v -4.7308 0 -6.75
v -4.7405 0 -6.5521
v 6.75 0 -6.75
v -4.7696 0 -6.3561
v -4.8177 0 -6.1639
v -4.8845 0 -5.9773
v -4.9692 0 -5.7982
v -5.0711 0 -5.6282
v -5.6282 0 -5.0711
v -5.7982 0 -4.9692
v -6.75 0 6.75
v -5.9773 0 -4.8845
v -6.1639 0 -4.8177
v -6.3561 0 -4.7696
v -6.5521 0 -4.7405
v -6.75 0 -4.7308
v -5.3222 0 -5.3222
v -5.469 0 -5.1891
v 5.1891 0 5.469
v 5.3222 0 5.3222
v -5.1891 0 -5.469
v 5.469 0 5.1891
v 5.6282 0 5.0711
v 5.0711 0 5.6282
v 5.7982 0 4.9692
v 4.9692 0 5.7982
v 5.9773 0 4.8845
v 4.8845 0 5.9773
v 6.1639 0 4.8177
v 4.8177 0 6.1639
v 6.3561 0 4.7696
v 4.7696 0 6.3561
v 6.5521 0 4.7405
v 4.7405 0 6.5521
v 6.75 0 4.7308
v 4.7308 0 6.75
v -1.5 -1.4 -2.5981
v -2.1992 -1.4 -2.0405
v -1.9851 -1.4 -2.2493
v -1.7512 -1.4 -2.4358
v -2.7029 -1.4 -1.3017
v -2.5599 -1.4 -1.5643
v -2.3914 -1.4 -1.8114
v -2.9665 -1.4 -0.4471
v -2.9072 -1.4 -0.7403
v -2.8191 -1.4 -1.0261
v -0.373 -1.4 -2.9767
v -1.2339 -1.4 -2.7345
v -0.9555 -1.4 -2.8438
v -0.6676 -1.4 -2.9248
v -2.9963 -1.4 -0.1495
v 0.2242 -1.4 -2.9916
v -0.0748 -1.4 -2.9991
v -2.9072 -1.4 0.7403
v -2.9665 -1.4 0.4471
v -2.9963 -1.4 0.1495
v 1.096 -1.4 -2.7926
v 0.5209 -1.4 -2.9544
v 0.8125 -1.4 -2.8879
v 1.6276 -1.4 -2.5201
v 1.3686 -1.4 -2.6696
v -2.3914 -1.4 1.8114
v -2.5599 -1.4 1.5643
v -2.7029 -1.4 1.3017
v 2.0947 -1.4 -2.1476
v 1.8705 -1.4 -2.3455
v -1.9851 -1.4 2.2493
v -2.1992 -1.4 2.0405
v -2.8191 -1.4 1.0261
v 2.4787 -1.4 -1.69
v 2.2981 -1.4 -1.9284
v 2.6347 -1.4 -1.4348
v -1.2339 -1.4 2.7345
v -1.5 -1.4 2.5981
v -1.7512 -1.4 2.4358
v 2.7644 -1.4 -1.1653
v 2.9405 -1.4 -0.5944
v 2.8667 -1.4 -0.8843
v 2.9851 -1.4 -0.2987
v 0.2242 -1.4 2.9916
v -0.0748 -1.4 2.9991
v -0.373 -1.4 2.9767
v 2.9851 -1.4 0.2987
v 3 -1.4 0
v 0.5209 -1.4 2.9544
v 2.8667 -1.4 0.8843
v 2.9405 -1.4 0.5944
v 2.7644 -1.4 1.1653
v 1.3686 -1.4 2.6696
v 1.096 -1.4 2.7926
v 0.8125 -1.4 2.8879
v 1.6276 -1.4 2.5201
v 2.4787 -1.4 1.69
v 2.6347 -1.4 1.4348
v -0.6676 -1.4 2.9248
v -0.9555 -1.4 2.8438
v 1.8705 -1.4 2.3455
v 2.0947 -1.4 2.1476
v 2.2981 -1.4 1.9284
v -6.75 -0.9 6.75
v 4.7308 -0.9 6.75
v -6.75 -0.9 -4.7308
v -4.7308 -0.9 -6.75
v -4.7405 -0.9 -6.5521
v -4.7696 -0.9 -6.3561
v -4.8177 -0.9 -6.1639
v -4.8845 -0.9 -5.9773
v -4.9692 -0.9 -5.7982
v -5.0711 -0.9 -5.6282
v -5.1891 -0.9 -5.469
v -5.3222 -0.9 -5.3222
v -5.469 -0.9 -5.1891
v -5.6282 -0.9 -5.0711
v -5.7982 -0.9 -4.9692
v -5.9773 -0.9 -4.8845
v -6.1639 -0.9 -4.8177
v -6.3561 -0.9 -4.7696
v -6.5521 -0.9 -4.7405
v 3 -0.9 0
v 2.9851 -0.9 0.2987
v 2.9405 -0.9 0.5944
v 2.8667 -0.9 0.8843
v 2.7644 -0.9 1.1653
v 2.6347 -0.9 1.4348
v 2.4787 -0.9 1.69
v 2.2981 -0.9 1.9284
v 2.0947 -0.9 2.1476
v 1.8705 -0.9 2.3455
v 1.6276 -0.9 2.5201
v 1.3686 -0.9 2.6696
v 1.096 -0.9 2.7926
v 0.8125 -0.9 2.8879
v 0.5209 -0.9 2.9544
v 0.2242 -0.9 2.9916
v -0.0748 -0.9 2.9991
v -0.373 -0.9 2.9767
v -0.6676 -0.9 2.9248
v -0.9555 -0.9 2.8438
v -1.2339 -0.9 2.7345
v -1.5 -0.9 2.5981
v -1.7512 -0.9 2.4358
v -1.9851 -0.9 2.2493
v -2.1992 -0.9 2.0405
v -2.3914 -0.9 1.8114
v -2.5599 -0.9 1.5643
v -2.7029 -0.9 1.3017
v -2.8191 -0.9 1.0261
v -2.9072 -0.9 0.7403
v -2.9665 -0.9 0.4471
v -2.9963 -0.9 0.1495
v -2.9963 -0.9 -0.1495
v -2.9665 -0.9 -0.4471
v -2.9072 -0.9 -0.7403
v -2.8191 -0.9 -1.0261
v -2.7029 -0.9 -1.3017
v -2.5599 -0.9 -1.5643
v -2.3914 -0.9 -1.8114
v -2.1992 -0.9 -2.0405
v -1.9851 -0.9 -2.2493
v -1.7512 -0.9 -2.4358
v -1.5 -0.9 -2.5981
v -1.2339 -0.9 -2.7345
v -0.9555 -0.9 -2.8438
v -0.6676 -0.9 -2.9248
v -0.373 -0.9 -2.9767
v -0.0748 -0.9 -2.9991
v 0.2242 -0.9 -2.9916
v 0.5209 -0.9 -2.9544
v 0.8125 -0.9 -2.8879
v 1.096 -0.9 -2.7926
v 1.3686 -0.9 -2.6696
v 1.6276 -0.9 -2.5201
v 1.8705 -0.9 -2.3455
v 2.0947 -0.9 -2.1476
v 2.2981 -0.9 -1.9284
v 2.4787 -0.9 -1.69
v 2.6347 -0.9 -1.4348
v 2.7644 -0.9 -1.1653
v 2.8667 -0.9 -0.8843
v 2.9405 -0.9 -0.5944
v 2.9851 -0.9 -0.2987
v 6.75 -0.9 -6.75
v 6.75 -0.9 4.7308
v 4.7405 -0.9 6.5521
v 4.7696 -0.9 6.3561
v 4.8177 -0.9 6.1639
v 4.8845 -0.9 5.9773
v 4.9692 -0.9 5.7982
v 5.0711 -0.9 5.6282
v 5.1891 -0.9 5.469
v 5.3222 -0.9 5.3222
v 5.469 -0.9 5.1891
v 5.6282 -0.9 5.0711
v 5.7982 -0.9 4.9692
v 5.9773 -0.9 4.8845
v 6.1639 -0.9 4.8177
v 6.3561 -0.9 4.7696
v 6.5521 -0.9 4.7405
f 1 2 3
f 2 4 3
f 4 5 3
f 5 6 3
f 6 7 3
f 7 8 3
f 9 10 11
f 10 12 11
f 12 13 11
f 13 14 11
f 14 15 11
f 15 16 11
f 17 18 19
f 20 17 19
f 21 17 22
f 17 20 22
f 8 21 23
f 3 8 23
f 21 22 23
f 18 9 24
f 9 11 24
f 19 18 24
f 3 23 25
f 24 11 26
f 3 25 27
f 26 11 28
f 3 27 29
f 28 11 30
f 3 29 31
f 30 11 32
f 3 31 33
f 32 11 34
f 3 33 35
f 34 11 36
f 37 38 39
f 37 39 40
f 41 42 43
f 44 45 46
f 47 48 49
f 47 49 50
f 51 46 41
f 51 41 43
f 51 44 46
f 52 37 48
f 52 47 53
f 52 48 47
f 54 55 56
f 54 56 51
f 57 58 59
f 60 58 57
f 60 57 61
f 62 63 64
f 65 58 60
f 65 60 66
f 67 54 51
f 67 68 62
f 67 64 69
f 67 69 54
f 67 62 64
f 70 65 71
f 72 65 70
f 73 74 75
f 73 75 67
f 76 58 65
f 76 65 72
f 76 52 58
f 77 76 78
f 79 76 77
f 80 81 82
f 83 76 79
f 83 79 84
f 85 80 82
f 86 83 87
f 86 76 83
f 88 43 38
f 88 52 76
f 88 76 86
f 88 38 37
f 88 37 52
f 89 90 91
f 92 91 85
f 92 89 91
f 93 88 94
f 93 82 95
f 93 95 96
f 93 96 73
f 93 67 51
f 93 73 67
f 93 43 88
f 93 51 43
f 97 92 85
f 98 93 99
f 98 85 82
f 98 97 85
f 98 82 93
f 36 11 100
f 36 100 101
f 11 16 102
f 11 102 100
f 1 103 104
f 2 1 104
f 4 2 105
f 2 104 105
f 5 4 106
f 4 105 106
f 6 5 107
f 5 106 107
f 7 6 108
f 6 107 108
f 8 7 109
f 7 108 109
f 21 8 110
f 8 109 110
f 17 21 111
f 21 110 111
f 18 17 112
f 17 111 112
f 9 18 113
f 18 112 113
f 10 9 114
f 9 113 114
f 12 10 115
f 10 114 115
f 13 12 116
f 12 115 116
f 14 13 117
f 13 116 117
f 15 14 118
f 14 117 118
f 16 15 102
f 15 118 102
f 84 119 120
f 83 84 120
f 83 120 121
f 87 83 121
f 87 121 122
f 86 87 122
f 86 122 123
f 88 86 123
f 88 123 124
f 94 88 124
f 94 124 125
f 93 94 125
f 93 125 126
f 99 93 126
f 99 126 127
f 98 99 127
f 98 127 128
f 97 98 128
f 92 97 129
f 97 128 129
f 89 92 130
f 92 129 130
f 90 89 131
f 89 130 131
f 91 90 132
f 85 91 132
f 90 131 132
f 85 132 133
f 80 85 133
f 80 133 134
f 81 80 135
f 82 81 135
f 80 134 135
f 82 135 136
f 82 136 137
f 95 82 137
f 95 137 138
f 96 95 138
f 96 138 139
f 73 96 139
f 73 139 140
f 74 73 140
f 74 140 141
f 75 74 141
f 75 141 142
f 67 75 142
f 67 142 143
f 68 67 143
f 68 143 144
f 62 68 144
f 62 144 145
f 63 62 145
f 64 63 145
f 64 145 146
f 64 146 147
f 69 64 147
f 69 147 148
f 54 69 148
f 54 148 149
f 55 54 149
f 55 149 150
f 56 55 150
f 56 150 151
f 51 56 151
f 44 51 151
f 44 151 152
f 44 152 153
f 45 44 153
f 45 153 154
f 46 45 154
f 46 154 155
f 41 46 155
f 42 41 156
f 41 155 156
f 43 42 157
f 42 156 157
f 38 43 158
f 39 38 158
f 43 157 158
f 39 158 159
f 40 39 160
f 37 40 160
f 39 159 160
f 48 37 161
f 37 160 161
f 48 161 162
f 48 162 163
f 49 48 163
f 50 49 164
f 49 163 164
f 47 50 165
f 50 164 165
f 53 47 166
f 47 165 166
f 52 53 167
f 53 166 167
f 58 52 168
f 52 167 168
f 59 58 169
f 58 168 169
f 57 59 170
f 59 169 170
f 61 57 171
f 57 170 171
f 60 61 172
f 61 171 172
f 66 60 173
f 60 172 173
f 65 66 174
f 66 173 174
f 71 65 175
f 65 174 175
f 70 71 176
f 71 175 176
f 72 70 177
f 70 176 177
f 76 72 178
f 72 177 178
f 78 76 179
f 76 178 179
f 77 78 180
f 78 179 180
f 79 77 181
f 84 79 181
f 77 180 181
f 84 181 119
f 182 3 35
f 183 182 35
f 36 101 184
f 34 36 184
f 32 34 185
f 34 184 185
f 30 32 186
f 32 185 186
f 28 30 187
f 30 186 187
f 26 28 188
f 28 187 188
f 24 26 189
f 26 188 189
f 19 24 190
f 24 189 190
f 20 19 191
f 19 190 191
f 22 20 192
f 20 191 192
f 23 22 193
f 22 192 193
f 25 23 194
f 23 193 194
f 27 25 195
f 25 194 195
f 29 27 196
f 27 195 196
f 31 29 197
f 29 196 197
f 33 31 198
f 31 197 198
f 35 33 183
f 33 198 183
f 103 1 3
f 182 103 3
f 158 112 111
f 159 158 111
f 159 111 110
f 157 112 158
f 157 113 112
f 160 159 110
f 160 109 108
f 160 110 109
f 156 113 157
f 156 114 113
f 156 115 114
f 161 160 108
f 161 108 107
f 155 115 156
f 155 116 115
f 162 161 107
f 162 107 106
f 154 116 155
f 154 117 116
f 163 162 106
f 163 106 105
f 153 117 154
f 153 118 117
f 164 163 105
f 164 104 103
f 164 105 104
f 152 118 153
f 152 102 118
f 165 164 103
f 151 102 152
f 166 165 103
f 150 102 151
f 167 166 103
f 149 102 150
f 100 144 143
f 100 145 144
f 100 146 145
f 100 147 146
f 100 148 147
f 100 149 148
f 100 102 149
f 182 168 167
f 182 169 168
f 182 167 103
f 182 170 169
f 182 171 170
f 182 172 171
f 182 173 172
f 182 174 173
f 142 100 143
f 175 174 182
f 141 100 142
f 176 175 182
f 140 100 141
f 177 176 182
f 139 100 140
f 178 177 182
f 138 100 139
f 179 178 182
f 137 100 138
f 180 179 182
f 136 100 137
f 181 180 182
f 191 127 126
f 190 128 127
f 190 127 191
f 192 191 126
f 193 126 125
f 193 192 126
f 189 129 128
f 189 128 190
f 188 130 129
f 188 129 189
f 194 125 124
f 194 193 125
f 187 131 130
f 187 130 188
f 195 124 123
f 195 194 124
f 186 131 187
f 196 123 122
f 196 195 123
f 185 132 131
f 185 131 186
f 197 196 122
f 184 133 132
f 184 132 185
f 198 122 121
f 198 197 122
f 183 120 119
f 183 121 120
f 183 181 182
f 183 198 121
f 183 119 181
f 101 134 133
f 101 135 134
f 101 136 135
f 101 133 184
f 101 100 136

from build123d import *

# Parameters (mm, degrees)
F0_R     = 3
F1_DEPTH = 1.4
F0_W     = 13.5
F0_H     = 13.5
F2_DEPTH = 0.9
F4_DEPTH = 25


with BuildPart() as f1:
    # F0 (on Front) → F1 (new body)
    with BuildSketch(Plane.XZ):
        Circle(F0_R)
    extrude(amount=F1_DEPTH)

    # F0 (on Front) → F2 (join)
    with BuildSketch(Plane.XZ):
        Rectangle(F0_W, F0_H)
        Circle(F0_R, mode=Mode.SUBTRACT)
    extrude(amount=F2_DEPTH)

    # F3 (on face) → F4 (cut)
    with BuildSketch(Plane.XZ.offset(0.9)):
        with BuildLine():
            Line((6.75, 6.75), (4.7308, 6.75))
            ThreePointArc((4.7308, 6.75), (5.32221, 5.32221), (6.75, 4.7308))
            Line((6.75, 4.7308), (6.75, 6.75))
        make_face()
        with BuildLine():
            ThreePointArc((6.75, 4.7308), (8.17779, 5.32221), (8.7692, 6.75))
            ThreePointArc((8.7692, 6.75), (6.75, 8.7692), (4.7308, 6.75))
            Line((4.7308, 6.75), (6.75, 6.75))
            Line((6.75, 6.75), (6.75, 4.7308))
        make_face()
        with BuildLine():
            Line((-6.75, -6.75), (-6.75, -4.7308))
            ThreePointArc((-6.75, -4.7308), (-8.17779, -8.17779), (-4.7308, -6.75))
            Line((-4.7308, -6.75), (-6.75, -6.75))
        make_face()
        with BuildLine():
            ThreePointArc((-4.7308, -6.75), (-5.32221, -5.32221), (-6.75, -4.7308))
            Line((-6.75, -4.7308), (-6.75, -6.75))
            Line((-6.75, -6.75), (-4.7308, -6.75))
        make_face()
    extrude(amount=-F4_DEPTH, mode=Mode.SUBTRACT)


solid = f1.part
